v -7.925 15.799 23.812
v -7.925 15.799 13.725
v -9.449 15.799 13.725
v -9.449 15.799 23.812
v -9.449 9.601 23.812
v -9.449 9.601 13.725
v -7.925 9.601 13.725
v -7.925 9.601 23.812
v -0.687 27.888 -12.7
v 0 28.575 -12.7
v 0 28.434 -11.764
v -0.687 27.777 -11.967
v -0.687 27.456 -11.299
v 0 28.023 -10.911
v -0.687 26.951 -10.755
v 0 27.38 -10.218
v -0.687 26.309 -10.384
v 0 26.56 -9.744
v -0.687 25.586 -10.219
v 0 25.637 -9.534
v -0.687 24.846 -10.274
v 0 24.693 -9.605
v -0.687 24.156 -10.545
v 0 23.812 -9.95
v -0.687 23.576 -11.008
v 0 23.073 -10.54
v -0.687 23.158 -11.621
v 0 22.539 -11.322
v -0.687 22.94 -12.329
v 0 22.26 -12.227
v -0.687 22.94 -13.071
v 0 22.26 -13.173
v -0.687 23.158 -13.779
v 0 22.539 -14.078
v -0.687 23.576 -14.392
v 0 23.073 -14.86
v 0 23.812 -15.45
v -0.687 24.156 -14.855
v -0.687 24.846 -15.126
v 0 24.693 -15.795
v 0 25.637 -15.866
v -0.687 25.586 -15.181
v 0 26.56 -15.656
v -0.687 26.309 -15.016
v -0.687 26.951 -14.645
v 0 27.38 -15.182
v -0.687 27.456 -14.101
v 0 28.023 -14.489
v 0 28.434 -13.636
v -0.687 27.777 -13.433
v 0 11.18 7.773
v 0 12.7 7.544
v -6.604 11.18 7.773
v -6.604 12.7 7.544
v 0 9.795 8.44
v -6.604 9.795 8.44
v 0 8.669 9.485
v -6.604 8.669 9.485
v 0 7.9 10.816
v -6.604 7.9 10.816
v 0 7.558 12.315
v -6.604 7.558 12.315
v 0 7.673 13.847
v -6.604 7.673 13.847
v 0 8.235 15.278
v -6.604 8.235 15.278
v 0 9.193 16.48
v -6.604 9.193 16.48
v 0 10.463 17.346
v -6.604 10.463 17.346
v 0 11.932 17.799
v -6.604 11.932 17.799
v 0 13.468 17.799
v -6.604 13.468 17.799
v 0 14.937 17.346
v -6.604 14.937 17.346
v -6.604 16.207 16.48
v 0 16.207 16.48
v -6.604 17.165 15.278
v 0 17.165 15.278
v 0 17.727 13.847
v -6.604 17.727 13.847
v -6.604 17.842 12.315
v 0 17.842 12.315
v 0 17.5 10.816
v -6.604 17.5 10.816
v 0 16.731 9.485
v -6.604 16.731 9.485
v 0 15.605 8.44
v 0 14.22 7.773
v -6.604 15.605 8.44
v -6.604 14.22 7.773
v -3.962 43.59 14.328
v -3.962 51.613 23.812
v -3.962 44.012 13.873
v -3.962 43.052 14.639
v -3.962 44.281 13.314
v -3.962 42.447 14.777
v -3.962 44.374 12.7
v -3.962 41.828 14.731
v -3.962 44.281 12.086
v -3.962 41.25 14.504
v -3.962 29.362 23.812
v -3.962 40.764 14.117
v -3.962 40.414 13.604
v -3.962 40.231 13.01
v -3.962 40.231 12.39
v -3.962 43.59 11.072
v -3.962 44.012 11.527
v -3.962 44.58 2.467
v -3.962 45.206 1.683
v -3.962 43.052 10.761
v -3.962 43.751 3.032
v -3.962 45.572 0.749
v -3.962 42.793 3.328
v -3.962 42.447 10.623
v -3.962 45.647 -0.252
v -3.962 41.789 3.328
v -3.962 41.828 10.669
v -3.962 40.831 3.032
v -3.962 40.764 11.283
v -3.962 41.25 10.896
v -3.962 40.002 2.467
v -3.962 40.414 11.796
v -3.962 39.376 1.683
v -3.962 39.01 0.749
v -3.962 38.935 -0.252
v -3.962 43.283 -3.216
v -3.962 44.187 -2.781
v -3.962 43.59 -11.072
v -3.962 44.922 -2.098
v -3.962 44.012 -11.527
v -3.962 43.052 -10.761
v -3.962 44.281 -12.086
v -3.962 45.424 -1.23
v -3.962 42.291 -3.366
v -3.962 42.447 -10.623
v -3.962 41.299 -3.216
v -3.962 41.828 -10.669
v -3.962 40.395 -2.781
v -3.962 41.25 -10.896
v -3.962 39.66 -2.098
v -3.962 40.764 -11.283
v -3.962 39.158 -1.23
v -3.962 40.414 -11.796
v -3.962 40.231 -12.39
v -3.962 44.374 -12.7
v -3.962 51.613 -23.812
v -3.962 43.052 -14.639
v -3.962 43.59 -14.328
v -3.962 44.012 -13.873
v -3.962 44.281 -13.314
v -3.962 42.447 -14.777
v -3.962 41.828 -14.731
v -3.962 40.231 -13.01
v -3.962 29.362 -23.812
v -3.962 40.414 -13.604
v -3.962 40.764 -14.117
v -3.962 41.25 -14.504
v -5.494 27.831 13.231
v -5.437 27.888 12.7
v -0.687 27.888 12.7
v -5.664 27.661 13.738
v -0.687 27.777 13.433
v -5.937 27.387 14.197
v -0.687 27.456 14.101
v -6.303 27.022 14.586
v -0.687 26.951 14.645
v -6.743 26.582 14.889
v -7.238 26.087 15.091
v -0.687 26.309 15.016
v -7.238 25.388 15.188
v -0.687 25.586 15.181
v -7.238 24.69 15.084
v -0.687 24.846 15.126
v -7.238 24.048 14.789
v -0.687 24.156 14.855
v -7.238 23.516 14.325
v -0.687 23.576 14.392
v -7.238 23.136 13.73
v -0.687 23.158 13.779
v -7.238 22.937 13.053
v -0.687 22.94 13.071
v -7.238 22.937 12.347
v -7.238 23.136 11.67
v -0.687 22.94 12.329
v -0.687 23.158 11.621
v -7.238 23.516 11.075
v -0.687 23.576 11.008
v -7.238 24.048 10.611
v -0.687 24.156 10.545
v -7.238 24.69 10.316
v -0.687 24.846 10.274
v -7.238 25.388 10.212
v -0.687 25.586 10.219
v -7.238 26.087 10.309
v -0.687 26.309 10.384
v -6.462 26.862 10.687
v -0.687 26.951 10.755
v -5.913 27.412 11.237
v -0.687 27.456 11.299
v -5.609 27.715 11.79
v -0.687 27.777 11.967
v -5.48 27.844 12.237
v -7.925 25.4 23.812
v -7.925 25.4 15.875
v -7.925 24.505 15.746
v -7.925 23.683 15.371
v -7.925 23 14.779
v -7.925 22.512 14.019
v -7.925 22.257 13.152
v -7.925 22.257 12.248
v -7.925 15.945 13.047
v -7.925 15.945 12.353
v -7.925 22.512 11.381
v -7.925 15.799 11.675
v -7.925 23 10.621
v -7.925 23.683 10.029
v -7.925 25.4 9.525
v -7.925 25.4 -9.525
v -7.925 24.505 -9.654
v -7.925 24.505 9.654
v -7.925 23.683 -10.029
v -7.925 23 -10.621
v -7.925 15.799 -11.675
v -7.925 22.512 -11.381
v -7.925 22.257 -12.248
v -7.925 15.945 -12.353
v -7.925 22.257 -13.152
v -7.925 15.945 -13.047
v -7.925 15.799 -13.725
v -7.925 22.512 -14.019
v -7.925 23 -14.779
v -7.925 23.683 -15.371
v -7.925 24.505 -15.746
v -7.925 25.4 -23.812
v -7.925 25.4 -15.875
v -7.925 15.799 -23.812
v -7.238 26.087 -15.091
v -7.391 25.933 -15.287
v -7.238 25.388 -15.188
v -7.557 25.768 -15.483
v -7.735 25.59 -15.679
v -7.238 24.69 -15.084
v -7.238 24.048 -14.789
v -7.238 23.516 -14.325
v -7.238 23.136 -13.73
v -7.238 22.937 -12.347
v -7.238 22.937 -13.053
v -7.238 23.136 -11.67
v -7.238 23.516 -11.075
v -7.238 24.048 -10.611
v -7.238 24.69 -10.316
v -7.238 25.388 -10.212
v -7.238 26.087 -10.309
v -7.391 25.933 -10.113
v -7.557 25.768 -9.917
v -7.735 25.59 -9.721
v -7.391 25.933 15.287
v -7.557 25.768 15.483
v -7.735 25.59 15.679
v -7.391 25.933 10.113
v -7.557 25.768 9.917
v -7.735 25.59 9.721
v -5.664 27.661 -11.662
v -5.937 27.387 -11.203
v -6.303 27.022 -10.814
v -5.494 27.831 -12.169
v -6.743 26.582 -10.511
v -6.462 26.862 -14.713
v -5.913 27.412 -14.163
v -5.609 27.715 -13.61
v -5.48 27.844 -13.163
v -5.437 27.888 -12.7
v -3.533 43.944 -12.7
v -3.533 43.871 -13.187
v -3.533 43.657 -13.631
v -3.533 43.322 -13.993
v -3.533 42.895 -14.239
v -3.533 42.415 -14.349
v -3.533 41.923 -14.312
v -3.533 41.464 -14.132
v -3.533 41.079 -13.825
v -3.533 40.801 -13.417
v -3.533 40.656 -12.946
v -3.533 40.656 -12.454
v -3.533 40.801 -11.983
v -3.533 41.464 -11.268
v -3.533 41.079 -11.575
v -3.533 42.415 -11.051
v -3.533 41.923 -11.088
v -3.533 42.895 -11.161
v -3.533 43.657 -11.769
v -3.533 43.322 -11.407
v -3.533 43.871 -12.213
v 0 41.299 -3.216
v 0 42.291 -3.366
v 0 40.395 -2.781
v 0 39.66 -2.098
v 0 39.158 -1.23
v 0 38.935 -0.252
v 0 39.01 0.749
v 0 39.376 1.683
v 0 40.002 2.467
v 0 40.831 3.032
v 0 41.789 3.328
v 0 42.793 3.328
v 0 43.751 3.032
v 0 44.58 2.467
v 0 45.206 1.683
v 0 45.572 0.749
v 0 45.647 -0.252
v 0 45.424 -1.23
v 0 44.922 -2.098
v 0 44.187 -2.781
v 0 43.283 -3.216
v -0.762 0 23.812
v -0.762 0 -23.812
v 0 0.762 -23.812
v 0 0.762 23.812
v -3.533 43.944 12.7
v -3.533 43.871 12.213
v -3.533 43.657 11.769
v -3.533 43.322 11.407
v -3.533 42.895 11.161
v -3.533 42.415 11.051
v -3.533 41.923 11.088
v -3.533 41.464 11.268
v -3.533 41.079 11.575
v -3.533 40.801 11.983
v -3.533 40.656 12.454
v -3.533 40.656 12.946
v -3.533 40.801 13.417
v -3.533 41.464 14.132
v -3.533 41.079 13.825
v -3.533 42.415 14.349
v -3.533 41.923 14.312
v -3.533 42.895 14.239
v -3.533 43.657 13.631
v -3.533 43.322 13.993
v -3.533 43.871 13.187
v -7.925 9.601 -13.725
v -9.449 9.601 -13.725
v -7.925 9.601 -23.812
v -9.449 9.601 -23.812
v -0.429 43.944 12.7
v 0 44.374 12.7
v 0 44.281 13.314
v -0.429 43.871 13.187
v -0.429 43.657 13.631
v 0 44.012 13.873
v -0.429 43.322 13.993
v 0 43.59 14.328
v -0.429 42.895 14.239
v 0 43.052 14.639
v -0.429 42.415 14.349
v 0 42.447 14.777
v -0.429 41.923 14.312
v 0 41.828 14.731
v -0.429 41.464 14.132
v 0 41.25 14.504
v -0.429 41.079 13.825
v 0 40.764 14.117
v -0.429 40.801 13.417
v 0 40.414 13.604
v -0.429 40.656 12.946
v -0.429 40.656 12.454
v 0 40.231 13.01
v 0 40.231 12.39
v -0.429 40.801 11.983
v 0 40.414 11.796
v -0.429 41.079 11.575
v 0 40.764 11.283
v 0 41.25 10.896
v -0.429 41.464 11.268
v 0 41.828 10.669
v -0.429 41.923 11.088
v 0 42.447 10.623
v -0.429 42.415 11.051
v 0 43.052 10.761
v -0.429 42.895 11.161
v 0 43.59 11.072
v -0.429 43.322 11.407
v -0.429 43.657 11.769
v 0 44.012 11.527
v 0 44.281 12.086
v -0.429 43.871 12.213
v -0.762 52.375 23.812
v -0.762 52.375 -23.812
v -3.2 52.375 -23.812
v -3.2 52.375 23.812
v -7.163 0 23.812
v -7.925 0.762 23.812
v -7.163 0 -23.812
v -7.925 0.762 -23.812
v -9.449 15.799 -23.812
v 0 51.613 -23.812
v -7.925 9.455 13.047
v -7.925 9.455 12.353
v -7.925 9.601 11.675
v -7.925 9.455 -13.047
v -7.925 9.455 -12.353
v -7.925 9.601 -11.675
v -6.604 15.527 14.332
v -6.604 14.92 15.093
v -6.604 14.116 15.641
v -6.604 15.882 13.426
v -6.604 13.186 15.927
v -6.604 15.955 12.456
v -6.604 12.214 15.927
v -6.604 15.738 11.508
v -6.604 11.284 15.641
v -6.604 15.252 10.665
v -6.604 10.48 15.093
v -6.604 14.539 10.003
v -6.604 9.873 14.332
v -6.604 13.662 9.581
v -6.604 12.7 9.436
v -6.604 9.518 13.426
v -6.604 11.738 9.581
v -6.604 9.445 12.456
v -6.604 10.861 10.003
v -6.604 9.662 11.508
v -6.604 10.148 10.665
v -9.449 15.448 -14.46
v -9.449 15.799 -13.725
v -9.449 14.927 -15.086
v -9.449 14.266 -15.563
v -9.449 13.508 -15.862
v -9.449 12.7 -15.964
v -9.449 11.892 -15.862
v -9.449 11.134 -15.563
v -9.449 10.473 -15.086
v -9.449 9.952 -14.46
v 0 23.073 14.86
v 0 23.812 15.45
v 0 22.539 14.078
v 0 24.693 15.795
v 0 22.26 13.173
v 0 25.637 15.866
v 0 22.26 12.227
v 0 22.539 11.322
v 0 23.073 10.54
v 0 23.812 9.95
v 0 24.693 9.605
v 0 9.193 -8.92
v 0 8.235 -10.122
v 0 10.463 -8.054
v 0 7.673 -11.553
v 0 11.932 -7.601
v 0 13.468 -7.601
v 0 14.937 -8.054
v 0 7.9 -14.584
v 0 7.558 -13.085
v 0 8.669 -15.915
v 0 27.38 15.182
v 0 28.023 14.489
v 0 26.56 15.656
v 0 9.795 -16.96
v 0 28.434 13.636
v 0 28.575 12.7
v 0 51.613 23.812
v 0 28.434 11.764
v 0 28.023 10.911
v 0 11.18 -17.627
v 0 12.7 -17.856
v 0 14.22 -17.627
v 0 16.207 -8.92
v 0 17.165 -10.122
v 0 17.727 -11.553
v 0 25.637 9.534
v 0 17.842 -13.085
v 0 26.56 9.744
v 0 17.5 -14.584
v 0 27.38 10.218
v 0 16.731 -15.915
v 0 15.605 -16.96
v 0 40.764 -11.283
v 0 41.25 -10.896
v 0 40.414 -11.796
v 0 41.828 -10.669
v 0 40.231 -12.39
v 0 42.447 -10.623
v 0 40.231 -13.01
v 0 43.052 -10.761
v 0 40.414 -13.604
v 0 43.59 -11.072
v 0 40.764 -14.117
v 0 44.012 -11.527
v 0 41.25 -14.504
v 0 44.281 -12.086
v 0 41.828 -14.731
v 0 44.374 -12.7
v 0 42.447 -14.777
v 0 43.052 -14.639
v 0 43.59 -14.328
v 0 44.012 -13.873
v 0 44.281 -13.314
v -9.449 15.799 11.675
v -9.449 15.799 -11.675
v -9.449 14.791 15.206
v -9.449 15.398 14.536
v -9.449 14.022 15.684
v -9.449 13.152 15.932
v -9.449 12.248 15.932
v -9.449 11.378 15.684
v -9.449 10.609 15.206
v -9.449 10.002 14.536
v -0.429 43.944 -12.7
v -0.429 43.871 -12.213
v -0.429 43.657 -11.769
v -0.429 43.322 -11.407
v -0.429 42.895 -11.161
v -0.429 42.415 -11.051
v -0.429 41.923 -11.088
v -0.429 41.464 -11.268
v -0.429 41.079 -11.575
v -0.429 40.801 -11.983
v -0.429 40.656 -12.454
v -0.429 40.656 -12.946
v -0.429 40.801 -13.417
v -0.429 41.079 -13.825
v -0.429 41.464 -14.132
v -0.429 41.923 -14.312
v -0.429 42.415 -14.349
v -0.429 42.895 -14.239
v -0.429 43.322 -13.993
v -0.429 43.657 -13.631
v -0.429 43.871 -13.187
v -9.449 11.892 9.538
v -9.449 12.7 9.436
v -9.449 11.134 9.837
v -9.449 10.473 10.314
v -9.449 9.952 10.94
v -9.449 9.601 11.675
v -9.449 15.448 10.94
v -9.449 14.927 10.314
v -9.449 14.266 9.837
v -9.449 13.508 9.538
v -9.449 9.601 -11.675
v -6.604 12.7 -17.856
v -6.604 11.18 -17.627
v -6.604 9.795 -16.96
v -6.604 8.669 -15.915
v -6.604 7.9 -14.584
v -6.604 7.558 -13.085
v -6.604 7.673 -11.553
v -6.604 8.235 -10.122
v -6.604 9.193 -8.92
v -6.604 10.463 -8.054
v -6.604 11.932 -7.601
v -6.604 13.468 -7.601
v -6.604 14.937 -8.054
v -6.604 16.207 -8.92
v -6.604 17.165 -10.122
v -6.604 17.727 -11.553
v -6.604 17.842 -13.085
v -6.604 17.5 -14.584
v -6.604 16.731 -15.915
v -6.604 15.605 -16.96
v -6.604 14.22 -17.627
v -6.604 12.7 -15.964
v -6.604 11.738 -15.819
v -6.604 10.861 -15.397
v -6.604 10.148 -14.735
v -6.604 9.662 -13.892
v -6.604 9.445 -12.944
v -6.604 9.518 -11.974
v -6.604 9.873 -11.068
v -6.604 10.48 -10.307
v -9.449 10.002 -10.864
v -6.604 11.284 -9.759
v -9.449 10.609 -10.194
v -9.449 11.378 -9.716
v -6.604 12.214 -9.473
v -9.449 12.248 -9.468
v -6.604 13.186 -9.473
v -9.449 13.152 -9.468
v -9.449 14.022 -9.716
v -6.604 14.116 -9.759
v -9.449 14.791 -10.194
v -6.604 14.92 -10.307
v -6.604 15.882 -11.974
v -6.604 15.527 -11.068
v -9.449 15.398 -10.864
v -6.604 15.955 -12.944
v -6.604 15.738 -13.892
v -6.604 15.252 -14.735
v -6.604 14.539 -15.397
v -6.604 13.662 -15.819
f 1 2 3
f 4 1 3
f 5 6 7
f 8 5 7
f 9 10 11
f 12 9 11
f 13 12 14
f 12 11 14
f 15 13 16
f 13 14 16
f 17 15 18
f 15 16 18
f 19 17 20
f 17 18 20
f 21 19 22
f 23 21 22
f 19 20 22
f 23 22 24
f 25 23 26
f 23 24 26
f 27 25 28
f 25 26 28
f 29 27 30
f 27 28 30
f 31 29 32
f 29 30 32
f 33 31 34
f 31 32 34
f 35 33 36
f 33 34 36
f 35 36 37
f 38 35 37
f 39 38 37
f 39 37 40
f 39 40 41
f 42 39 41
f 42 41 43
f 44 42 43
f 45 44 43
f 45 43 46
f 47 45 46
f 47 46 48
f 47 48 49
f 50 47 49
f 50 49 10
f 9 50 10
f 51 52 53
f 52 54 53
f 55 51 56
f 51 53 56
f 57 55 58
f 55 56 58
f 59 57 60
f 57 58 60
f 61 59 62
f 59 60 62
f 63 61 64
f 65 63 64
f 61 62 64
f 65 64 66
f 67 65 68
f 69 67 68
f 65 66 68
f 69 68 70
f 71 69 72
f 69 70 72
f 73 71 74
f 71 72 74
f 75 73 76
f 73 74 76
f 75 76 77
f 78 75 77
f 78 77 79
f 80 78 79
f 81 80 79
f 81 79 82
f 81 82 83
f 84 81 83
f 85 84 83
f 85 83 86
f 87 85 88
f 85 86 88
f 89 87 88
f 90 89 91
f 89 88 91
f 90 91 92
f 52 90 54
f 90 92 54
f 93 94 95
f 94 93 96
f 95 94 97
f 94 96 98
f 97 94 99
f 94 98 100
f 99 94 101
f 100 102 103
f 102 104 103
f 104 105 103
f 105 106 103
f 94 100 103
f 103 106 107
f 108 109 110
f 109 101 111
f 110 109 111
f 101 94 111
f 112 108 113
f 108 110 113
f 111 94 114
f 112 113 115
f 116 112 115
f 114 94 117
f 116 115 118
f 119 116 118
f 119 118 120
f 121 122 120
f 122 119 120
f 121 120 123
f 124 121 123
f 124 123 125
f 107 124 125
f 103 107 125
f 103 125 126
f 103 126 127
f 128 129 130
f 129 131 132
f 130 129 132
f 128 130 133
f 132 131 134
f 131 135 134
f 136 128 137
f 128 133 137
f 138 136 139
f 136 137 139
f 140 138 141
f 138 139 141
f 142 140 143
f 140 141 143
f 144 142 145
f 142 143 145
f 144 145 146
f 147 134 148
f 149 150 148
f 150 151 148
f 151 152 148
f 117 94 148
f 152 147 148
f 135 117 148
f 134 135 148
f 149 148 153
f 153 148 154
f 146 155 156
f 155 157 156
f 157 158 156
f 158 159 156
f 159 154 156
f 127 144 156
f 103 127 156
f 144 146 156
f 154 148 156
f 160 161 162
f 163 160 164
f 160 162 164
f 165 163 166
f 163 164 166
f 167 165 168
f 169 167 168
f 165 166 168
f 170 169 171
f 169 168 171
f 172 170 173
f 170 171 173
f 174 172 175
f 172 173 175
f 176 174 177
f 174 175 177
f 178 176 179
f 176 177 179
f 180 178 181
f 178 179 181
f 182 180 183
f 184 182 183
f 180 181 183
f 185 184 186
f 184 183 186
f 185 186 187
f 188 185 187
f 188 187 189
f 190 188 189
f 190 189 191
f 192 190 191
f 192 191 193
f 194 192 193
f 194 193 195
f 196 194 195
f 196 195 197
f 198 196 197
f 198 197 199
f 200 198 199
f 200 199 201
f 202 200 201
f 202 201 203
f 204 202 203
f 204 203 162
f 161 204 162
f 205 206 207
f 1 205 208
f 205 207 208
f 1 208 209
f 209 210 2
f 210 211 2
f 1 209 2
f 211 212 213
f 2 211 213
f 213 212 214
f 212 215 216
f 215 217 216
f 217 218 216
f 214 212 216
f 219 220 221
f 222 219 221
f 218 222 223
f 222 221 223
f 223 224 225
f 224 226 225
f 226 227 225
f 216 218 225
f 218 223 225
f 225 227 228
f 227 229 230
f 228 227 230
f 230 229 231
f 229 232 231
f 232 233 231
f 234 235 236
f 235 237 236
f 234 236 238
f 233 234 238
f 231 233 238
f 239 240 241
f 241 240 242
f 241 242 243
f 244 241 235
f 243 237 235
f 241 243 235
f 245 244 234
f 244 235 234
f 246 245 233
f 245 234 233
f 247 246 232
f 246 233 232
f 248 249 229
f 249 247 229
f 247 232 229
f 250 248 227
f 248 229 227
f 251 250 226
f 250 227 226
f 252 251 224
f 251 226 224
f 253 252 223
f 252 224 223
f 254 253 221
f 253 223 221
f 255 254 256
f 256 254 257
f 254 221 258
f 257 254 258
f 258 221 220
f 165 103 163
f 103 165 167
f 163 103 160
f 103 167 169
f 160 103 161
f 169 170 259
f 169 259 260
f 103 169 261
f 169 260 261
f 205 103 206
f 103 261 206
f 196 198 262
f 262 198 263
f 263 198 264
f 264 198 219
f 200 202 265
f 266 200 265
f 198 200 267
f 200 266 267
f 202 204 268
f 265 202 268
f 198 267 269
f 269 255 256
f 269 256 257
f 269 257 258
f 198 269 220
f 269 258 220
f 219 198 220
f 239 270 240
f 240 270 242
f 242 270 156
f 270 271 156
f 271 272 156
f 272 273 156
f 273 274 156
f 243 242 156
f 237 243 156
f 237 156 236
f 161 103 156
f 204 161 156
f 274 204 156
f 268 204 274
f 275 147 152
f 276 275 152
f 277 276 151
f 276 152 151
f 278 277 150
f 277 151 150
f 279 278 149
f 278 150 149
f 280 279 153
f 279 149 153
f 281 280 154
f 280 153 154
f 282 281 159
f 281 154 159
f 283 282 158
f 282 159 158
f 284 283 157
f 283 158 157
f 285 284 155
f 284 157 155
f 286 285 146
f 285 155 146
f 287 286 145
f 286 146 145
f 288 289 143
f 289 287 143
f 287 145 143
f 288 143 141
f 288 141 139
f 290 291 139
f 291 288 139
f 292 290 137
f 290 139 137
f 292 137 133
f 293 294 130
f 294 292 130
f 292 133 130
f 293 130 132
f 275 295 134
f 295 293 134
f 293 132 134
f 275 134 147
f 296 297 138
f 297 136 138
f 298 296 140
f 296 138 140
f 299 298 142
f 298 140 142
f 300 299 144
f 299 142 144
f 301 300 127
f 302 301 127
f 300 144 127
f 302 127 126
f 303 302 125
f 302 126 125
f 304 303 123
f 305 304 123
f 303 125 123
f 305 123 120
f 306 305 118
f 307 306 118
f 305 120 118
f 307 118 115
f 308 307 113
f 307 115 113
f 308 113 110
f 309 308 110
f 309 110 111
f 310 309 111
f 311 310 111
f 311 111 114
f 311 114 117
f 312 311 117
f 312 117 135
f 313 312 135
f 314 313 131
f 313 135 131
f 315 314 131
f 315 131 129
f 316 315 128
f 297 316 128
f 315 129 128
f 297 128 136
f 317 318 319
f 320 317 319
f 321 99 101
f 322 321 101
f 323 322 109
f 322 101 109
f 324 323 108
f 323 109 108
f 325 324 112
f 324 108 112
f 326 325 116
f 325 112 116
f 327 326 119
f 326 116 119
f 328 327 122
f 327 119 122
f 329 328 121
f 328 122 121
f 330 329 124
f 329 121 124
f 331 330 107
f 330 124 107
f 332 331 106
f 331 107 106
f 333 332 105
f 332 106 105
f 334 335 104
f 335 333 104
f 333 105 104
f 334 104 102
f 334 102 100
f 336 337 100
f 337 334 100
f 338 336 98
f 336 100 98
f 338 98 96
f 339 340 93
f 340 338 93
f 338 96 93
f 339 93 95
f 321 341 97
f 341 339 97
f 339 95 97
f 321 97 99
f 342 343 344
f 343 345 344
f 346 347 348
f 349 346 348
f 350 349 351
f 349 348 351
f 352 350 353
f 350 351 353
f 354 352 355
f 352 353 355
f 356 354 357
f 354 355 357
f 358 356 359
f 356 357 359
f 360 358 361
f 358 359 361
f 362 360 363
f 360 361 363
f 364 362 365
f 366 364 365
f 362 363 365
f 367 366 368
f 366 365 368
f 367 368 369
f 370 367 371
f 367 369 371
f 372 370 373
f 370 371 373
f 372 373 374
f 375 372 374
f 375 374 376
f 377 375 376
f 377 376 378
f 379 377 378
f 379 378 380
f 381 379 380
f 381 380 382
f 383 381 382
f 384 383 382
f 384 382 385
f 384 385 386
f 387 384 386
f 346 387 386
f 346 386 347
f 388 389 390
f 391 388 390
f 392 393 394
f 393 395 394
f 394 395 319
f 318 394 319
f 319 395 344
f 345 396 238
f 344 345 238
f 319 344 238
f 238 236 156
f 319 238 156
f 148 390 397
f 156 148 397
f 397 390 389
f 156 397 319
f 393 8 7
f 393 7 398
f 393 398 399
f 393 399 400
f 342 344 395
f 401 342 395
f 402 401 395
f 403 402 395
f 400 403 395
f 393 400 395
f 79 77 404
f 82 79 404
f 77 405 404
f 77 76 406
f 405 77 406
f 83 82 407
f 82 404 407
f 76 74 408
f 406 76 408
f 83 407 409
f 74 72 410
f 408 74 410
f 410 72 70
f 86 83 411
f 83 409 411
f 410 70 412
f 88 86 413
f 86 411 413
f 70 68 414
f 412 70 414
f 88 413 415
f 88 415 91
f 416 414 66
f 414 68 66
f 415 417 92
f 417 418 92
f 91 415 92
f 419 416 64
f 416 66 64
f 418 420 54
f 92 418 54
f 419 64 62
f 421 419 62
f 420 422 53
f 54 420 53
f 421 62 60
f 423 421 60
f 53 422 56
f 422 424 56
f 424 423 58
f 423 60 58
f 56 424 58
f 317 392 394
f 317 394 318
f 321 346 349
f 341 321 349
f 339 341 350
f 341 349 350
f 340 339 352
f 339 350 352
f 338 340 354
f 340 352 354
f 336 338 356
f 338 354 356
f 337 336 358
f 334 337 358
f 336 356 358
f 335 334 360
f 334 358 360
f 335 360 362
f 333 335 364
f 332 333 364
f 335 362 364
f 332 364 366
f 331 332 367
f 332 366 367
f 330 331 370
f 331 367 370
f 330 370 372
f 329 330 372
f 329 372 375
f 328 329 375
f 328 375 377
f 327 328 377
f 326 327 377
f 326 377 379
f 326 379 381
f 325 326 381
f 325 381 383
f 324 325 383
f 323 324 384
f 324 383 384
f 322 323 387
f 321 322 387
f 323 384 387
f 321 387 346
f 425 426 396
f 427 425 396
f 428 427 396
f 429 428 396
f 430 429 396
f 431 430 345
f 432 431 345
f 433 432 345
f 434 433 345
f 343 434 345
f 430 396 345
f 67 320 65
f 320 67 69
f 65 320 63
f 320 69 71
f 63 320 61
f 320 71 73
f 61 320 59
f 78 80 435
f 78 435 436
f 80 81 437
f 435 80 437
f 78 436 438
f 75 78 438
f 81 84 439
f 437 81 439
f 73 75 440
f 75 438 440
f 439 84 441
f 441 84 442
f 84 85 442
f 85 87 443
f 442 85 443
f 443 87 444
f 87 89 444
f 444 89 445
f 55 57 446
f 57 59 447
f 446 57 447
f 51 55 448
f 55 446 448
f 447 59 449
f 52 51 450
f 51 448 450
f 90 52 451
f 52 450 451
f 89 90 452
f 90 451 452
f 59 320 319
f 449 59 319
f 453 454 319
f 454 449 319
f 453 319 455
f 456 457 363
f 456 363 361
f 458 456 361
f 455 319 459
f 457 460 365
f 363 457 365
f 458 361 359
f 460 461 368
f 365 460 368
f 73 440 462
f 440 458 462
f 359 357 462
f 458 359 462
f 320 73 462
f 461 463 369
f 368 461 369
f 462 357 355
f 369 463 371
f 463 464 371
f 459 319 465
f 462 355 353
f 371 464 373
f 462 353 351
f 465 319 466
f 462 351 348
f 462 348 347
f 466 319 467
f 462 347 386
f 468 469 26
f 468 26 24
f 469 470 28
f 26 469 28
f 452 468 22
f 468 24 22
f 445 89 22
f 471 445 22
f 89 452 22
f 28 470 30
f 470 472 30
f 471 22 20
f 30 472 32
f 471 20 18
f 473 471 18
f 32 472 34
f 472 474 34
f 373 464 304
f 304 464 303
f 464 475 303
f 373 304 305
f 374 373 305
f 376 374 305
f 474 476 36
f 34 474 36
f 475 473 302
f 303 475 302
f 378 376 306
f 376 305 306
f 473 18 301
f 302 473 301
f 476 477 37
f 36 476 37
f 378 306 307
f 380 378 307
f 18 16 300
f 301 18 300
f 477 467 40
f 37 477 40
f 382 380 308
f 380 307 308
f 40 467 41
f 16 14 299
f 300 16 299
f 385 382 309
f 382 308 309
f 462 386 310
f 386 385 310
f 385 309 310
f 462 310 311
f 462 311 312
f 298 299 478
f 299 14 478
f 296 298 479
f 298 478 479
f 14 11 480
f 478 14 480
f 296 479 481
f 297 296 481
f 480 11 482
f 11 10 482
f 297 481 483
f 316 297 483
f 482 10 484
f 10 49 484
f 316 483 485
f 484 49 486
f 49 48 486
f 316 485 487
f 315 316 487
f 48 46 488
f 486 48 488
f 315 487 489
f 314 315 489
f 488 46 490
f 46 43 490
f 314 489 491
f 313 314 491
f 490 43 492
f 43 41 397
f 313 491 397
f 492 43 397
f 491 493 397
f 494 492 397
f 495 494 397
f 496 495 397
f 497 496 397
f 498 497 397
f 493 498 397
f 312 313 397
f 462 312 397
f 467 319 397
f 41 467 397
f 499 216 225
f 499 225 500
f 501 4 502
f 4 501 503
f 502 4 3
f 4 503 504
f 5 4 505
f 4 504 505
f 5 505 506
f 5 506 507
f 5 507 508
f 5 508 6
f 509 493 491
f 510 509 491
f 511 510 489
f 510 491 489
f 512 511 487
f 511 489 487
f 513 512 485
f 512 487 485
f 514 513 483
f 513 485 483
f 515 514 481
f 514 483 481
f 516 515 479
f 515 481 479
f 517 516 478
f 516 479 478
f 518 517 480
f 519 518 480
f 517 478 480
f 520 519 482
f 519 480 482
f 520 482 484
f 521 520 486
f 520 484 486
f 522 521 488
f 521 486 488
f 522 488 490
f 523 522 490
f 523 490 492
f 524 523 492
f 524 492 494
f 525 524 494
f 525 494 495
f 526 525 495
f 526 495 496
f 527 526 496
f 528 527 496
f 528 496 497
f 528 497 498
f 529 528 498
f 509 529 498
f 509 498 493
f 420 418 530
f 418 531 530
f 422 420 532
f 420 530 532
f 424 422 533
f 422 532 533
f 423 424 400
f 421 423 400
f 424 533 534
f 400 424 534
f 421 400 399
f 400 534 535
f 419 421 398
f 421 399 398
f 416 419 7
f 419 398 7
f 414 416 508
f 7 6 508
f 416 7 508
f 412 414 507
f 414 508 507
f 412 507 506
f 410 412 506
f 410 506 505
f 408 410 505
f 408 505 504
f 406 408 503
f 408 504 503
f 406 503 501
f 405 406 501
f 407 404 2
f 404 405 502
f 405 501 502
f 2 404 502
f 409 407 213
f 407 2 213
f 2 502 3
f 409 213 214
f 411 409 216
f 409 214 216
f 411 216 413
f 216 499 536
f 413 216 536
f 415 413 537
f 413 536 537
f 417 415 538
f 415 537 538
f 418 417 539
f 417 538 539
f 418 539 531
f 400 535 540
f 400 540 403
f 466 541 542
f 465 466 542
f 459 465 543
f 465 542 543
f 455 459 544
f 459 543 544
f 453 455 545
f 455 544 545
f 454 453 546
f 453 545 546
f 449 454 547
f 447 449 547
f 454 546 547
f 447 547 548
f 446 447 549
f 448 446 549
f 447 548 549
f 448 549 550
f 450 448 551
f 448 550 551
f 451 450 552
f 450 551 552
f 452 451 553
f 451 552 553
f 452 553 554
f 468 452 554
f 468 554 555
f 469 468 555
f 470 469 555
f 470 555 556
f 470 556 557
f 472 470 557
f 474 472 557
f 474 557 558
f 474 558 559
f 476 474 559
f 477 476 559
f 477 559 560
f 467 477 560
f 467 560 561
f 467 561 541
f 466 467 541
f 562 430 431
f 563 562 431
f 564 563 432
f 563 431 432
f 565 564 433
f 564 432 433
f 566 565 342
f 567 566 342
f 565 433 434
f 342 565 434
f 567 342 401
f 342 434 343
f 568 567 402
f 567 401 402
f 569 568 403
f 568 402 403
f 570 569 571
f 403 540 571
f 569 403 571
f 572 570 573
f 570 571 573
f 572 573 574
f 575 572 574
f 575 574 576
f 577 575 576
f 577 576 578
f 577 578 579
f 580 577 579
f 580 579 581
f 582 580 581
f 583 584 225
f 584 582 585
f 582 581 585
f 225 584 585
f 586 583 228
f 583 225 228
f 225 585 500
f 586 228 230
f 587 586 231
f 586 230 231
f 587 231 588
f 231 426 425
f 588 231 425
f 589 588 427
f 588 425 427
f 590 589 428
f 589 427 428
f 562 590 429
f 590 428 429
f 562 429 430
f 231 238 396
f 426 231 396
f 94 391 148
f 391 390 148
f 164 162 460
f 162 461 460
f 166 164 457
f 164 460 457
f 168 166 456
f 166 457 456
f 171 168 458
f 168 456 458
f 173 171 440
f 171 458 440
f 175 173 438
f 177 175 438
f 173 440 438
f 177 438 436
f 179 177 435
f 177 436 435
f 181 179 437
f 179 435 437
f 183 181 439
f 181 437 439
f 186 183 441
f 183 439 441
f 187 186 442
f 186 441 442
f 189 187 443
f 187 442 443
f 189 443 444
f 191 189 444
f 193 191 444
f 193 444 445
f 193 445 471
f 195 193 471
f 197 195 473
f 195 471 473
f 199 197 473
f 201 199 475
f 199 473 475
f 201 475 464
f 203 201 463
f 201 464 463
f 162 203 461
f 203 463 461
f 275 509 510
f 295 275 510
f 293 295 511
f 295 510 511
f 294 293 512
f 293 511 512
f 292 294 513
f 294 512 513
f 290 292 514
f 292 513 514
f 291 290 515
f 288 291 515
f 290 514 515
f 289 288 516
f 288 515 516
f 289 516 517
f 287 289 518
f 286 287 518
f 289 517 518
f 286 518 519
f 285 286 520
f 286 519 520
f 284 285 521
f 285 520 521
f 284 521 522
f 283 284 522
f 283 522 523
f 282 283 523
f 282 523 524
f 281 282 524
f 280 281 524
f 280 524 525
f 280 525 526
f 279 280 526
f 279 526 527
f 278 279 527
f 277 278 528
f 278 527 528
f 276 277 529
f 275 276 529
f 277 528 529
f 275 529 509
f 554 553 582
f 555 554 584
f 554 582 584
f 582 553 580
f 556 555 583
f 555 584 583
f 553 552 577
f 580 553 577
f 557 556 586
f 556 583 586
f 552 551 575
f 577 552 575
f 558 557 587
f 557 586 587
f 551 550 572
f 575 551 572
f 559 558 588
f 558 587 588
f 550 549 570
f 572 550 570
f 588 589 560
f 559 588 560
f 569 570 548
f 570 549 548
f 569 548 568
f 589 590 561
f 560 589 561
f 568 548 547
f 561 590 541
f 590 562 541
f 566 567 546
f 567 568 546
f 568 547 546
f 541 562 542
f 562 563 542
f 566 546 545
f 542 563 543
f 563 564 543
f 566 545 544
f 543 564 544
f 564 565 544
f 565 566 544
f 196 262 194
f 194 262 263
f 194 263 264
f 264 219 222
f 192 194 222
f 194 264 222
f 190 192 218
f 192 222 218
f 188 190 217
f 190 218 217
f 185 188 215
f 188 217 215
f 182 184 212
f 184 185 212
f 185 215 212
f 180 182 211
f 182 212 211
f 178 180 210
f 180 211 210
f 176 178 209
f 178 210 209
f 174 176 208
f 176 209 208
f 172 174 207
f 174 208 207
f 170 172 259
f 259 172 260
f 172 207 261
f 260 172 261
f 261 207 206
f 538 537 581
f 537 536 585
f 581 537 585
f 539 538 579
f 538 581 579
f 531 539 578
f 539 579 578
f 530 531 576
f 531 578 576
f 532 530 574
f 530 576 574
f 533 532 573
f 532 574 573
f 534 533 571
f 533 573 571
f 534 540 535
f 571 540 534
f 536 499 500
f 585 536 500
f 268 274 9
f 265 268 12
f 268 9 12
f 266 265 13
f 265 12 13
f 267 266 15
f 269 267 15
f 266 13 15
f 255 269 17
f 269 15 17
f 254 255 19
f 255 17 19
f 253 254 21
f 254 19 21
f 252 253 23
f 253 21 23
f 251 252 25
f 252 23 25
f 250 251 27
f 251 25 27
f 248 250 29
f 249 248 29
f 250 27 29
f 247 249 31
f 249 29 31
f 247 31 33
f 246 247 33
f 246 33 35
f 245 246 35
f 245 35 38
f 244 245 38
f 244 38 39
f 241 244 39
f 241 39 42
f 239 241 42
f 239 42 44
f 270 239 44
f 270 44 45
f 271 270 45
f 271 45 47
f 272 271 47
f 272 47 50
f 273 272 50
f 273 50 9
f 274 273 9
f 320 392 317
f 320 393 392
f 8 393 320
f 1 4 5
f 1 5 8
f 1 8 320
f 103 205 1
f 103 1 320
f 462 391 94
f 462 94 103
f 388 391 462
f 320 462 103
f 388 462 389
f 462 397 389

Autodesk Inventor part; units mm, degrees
sketch "Sketch_1" plane through (0, 0, 0) normal (0, 0, 1) x (1, 0, 0)
  line L0 (-9.4488, 15.7988) -> (-9.4488, 9.6012)
  line L1 (-9.4488, 9.6012) -> (-7.9248, 9.6012)
  line L2 (-7.9248, 9.6012) -> (-7.9248, 0.762)
  line L3 (-7.9248, 0.762) -> (-7.1628, 0)
  line L4 (-7.1628, 0) -> (-0.762, 0)
  line L5 (-0.762, 0) -> (0, 0.762)
  line L6 (0, 0.762) -> (0, 51.6128)
  line L7 (0, 51.6128) -> (-0.762, 52.3748)
  line L8 (-0.762, 52.3748) -> (-3.2004, 52.3748)
  line L9 (-3.2004, 52.3748) -> (-3.9624, 51.6128)
  line L10 (-3.9624, 51.6128) -> (-3.9624, 29.3624)
  line L11 (-3.9624, 29.3624) -> (-7.9248, 25.4)
  line L12 (-7.9248, 25.4) -> (-7.9248, 15.7988)
  line L13 (-7.9248, 15.7988) -> (-9.4488, 15.7988)
extrude "Extrusion1" add sketch "Sketch_1" along normal mid plane 47.625
sketch "Sketch_2" plane through (0, 0, 12.7) normal (0, 0, 1) x (1, 0, 0)
  line L0 (0, 42.291) -> (-3.9624, 42.291)
  line L1 (-3.9624, 42.291) -> (-3.9624, 44.3738)
  line L2 (-3.9624, 44.3738) -> (-3.5331, 43.9445)
  line L3 (-3.5331, 43.9445) -> (-0.4293, 43.9445)
  line L4 (-0.4293, 43.9445) -> (0, 44.3738)
  line L5 (0, 44.3738) -> (0, 42.291)
  line L6 (0, 42.291) -> (-3.9624, 42.291)
revolve "Revolution1" cut sketch "Sketch_2" angle 360 about axis through (0, 42.291, 12.7) along (1, 0, 0)
thread "Thread1" size "8-32 UNC" class "2B" standard "ANSI Unified Screw Threads" full length
pattern_linear "Rectangular Pattern1" count 2 spacing 25.4 along (0, 0, -1) of "Revolution1"
sketch "Sketch_4" plane through (0, 0, 12.7) normal (0, 0, 1) x (1, 0, 0)
  line L0 (0, 25.4) -> (-7.9248, 25.4)
  line L1 (-7.9248, 25.4) -> (-7.9248, 28.575)
  line L2 (-7.9248, 28.575) -> (-7.2377, 27.8879)
  line L3 (-7.2377, 27.8879) -> (-0.6871, 27.8879)
  line L4 (-0.6871, 27.8879) -> (0, 28.575)
  line L5 (0, 28.575) -> (0, 25.4)
  line L6 (0, 25.4) -> (-7.9248, 25.4)
revolve "Revolution2" cut sketch "Sketch_4" angle 360 about axis through (0, 25.4, 12.7) along (1, 0, 0)
thread "Thread2" size "1/4-20 UNC" class "2B" standard "ANSI Unified Screw Threads" length 6.5507
pattern_linear "Rectangular Pattern2" count 2 spacing 25.4 along (0, 0, -1) of "Revolution2"
sketch "Sketch4" plane through (0, 0.762, 23.8125) normal (1, 0, 0) x (0, 0, -1)
  point P0 (11.1125, 11.938)
hole "Hole1" at (0, 12.7, 12.7) direction (-1, 0, 0) diameter 6.5278 depth 9.4488 counterbore diameter 10.3124 counterbore depth 6.604
pattern_linear "Rectangular Pattern3" count 2 spacing 25.4 along (0, 0, -1) of "Hole1"
sketch "Sketch5" plane through (0, 0.762, 23.8125) normal (1, 0, 0) x (0, 0, -1)
  point P0 (23.8125, 41.529)
hole "Hole2" at (0, 42.291, 0) direction (-1, 0, 0) diameter 6.731 depth 3.9624
ref_plane "to_pad1_XY" through (-3.9624, 42.291, -12.7) normal (1, 0, 0) x (0, 0, -1)
ref_plane "to_pad1_YZ" through (-3.9624, 42.291, -12.7) normal (0, 0, -1) x (0, 1, 0)
ref_plane "to_pad1_ZX" through (-3.9624, 42.291, -12.7) normal (0, 1, 0) x (1, 0, 0)
ref_plane "to_pad2_XY" through (-3.9624, 42.291, -12.7) normal (1, 0, 0) x (0, 0, -1)
ref_plane "to_pad2_YZ" through (-3.9624, 42.291, -12.7) normal (0, 0, -1) x (0, 1, 0)
ref_plane "to_pad2_ZX" through (-3.9624, 42.291, -12.7) normal (0, 1, 0) x (1, 0, 0)
ref_plane "to_profile_XY" through (-7.9248, 12.7, 0) normal (1, 0, 0) x (0, 0, -1)
ref_plane "to_profile_YZ" through (-7.9248, 12.7, 0) normal (0, 0, -1) x (0, 1, 0)
ref_plane "to_profile_ZX" through (-7.9248, 12.7, 0) normal (0, 1, 0) x (1, 0, 0)
ref_plane "to_screw_1_XY" through (-6.604, 12.7, 12.7) normal (1, 0, 0) x (0, 0, -1)
ref_plane "to_screw_1_YZ" through (-6.604, 12.7, 12.7) normal (0, 0, -1) x (0, 1, 0)
ref_plane "to_screw_1_ZX" through (-6.604, 12.7, 12.7) normal (0, 1, 0) x (1, 0, 0)
ref_plane "to_screw_2_XY" through (-6.604, 12.7, -12.7) normal (1, 0, 0) x (0, 0, -1)
ref_plane "to_screw_2_YZ" through (-6.604, 12.7, -12.7) normal (0, 0, -1) x (0, 1, 0)
ref_plane "to_screw_2_ZX" through (-6.604, 12.7, -12.7) normal (0, 1, 0) x (1, 0, 0)
ref_plane "to_screw_3_XY" through (-6.604, 12.7, -12.7) normal (1, 0, 0) x (0, 0, -1)
ref_plane "to_screw_3_YZ" through (-6.604, 12.7, -12.7) normal (0, 0, -1) x (0, 1, 0)
ref_plane "to_screw_3_ZX" through (-6.604, 12.7, -12.7) normal (0, 1, 0) x (1, 0, 0)
ref_plane "to_screw_4_XY" through (-6.604, 12.7, -12.7) normal (1, 0, 0) x (0, 0, -1)
ref_plane "to_screw_4_YZ" through (-6.604, 12.7, -12.7) normal (0, 0, -1) x (0, 1, 0)
ref_plane "to_screw_4_ZX" through (-6.604, 12.7, -12.7) normal (0, 1, 0) x (1, 0, 0)
properties part number "6760_p"
